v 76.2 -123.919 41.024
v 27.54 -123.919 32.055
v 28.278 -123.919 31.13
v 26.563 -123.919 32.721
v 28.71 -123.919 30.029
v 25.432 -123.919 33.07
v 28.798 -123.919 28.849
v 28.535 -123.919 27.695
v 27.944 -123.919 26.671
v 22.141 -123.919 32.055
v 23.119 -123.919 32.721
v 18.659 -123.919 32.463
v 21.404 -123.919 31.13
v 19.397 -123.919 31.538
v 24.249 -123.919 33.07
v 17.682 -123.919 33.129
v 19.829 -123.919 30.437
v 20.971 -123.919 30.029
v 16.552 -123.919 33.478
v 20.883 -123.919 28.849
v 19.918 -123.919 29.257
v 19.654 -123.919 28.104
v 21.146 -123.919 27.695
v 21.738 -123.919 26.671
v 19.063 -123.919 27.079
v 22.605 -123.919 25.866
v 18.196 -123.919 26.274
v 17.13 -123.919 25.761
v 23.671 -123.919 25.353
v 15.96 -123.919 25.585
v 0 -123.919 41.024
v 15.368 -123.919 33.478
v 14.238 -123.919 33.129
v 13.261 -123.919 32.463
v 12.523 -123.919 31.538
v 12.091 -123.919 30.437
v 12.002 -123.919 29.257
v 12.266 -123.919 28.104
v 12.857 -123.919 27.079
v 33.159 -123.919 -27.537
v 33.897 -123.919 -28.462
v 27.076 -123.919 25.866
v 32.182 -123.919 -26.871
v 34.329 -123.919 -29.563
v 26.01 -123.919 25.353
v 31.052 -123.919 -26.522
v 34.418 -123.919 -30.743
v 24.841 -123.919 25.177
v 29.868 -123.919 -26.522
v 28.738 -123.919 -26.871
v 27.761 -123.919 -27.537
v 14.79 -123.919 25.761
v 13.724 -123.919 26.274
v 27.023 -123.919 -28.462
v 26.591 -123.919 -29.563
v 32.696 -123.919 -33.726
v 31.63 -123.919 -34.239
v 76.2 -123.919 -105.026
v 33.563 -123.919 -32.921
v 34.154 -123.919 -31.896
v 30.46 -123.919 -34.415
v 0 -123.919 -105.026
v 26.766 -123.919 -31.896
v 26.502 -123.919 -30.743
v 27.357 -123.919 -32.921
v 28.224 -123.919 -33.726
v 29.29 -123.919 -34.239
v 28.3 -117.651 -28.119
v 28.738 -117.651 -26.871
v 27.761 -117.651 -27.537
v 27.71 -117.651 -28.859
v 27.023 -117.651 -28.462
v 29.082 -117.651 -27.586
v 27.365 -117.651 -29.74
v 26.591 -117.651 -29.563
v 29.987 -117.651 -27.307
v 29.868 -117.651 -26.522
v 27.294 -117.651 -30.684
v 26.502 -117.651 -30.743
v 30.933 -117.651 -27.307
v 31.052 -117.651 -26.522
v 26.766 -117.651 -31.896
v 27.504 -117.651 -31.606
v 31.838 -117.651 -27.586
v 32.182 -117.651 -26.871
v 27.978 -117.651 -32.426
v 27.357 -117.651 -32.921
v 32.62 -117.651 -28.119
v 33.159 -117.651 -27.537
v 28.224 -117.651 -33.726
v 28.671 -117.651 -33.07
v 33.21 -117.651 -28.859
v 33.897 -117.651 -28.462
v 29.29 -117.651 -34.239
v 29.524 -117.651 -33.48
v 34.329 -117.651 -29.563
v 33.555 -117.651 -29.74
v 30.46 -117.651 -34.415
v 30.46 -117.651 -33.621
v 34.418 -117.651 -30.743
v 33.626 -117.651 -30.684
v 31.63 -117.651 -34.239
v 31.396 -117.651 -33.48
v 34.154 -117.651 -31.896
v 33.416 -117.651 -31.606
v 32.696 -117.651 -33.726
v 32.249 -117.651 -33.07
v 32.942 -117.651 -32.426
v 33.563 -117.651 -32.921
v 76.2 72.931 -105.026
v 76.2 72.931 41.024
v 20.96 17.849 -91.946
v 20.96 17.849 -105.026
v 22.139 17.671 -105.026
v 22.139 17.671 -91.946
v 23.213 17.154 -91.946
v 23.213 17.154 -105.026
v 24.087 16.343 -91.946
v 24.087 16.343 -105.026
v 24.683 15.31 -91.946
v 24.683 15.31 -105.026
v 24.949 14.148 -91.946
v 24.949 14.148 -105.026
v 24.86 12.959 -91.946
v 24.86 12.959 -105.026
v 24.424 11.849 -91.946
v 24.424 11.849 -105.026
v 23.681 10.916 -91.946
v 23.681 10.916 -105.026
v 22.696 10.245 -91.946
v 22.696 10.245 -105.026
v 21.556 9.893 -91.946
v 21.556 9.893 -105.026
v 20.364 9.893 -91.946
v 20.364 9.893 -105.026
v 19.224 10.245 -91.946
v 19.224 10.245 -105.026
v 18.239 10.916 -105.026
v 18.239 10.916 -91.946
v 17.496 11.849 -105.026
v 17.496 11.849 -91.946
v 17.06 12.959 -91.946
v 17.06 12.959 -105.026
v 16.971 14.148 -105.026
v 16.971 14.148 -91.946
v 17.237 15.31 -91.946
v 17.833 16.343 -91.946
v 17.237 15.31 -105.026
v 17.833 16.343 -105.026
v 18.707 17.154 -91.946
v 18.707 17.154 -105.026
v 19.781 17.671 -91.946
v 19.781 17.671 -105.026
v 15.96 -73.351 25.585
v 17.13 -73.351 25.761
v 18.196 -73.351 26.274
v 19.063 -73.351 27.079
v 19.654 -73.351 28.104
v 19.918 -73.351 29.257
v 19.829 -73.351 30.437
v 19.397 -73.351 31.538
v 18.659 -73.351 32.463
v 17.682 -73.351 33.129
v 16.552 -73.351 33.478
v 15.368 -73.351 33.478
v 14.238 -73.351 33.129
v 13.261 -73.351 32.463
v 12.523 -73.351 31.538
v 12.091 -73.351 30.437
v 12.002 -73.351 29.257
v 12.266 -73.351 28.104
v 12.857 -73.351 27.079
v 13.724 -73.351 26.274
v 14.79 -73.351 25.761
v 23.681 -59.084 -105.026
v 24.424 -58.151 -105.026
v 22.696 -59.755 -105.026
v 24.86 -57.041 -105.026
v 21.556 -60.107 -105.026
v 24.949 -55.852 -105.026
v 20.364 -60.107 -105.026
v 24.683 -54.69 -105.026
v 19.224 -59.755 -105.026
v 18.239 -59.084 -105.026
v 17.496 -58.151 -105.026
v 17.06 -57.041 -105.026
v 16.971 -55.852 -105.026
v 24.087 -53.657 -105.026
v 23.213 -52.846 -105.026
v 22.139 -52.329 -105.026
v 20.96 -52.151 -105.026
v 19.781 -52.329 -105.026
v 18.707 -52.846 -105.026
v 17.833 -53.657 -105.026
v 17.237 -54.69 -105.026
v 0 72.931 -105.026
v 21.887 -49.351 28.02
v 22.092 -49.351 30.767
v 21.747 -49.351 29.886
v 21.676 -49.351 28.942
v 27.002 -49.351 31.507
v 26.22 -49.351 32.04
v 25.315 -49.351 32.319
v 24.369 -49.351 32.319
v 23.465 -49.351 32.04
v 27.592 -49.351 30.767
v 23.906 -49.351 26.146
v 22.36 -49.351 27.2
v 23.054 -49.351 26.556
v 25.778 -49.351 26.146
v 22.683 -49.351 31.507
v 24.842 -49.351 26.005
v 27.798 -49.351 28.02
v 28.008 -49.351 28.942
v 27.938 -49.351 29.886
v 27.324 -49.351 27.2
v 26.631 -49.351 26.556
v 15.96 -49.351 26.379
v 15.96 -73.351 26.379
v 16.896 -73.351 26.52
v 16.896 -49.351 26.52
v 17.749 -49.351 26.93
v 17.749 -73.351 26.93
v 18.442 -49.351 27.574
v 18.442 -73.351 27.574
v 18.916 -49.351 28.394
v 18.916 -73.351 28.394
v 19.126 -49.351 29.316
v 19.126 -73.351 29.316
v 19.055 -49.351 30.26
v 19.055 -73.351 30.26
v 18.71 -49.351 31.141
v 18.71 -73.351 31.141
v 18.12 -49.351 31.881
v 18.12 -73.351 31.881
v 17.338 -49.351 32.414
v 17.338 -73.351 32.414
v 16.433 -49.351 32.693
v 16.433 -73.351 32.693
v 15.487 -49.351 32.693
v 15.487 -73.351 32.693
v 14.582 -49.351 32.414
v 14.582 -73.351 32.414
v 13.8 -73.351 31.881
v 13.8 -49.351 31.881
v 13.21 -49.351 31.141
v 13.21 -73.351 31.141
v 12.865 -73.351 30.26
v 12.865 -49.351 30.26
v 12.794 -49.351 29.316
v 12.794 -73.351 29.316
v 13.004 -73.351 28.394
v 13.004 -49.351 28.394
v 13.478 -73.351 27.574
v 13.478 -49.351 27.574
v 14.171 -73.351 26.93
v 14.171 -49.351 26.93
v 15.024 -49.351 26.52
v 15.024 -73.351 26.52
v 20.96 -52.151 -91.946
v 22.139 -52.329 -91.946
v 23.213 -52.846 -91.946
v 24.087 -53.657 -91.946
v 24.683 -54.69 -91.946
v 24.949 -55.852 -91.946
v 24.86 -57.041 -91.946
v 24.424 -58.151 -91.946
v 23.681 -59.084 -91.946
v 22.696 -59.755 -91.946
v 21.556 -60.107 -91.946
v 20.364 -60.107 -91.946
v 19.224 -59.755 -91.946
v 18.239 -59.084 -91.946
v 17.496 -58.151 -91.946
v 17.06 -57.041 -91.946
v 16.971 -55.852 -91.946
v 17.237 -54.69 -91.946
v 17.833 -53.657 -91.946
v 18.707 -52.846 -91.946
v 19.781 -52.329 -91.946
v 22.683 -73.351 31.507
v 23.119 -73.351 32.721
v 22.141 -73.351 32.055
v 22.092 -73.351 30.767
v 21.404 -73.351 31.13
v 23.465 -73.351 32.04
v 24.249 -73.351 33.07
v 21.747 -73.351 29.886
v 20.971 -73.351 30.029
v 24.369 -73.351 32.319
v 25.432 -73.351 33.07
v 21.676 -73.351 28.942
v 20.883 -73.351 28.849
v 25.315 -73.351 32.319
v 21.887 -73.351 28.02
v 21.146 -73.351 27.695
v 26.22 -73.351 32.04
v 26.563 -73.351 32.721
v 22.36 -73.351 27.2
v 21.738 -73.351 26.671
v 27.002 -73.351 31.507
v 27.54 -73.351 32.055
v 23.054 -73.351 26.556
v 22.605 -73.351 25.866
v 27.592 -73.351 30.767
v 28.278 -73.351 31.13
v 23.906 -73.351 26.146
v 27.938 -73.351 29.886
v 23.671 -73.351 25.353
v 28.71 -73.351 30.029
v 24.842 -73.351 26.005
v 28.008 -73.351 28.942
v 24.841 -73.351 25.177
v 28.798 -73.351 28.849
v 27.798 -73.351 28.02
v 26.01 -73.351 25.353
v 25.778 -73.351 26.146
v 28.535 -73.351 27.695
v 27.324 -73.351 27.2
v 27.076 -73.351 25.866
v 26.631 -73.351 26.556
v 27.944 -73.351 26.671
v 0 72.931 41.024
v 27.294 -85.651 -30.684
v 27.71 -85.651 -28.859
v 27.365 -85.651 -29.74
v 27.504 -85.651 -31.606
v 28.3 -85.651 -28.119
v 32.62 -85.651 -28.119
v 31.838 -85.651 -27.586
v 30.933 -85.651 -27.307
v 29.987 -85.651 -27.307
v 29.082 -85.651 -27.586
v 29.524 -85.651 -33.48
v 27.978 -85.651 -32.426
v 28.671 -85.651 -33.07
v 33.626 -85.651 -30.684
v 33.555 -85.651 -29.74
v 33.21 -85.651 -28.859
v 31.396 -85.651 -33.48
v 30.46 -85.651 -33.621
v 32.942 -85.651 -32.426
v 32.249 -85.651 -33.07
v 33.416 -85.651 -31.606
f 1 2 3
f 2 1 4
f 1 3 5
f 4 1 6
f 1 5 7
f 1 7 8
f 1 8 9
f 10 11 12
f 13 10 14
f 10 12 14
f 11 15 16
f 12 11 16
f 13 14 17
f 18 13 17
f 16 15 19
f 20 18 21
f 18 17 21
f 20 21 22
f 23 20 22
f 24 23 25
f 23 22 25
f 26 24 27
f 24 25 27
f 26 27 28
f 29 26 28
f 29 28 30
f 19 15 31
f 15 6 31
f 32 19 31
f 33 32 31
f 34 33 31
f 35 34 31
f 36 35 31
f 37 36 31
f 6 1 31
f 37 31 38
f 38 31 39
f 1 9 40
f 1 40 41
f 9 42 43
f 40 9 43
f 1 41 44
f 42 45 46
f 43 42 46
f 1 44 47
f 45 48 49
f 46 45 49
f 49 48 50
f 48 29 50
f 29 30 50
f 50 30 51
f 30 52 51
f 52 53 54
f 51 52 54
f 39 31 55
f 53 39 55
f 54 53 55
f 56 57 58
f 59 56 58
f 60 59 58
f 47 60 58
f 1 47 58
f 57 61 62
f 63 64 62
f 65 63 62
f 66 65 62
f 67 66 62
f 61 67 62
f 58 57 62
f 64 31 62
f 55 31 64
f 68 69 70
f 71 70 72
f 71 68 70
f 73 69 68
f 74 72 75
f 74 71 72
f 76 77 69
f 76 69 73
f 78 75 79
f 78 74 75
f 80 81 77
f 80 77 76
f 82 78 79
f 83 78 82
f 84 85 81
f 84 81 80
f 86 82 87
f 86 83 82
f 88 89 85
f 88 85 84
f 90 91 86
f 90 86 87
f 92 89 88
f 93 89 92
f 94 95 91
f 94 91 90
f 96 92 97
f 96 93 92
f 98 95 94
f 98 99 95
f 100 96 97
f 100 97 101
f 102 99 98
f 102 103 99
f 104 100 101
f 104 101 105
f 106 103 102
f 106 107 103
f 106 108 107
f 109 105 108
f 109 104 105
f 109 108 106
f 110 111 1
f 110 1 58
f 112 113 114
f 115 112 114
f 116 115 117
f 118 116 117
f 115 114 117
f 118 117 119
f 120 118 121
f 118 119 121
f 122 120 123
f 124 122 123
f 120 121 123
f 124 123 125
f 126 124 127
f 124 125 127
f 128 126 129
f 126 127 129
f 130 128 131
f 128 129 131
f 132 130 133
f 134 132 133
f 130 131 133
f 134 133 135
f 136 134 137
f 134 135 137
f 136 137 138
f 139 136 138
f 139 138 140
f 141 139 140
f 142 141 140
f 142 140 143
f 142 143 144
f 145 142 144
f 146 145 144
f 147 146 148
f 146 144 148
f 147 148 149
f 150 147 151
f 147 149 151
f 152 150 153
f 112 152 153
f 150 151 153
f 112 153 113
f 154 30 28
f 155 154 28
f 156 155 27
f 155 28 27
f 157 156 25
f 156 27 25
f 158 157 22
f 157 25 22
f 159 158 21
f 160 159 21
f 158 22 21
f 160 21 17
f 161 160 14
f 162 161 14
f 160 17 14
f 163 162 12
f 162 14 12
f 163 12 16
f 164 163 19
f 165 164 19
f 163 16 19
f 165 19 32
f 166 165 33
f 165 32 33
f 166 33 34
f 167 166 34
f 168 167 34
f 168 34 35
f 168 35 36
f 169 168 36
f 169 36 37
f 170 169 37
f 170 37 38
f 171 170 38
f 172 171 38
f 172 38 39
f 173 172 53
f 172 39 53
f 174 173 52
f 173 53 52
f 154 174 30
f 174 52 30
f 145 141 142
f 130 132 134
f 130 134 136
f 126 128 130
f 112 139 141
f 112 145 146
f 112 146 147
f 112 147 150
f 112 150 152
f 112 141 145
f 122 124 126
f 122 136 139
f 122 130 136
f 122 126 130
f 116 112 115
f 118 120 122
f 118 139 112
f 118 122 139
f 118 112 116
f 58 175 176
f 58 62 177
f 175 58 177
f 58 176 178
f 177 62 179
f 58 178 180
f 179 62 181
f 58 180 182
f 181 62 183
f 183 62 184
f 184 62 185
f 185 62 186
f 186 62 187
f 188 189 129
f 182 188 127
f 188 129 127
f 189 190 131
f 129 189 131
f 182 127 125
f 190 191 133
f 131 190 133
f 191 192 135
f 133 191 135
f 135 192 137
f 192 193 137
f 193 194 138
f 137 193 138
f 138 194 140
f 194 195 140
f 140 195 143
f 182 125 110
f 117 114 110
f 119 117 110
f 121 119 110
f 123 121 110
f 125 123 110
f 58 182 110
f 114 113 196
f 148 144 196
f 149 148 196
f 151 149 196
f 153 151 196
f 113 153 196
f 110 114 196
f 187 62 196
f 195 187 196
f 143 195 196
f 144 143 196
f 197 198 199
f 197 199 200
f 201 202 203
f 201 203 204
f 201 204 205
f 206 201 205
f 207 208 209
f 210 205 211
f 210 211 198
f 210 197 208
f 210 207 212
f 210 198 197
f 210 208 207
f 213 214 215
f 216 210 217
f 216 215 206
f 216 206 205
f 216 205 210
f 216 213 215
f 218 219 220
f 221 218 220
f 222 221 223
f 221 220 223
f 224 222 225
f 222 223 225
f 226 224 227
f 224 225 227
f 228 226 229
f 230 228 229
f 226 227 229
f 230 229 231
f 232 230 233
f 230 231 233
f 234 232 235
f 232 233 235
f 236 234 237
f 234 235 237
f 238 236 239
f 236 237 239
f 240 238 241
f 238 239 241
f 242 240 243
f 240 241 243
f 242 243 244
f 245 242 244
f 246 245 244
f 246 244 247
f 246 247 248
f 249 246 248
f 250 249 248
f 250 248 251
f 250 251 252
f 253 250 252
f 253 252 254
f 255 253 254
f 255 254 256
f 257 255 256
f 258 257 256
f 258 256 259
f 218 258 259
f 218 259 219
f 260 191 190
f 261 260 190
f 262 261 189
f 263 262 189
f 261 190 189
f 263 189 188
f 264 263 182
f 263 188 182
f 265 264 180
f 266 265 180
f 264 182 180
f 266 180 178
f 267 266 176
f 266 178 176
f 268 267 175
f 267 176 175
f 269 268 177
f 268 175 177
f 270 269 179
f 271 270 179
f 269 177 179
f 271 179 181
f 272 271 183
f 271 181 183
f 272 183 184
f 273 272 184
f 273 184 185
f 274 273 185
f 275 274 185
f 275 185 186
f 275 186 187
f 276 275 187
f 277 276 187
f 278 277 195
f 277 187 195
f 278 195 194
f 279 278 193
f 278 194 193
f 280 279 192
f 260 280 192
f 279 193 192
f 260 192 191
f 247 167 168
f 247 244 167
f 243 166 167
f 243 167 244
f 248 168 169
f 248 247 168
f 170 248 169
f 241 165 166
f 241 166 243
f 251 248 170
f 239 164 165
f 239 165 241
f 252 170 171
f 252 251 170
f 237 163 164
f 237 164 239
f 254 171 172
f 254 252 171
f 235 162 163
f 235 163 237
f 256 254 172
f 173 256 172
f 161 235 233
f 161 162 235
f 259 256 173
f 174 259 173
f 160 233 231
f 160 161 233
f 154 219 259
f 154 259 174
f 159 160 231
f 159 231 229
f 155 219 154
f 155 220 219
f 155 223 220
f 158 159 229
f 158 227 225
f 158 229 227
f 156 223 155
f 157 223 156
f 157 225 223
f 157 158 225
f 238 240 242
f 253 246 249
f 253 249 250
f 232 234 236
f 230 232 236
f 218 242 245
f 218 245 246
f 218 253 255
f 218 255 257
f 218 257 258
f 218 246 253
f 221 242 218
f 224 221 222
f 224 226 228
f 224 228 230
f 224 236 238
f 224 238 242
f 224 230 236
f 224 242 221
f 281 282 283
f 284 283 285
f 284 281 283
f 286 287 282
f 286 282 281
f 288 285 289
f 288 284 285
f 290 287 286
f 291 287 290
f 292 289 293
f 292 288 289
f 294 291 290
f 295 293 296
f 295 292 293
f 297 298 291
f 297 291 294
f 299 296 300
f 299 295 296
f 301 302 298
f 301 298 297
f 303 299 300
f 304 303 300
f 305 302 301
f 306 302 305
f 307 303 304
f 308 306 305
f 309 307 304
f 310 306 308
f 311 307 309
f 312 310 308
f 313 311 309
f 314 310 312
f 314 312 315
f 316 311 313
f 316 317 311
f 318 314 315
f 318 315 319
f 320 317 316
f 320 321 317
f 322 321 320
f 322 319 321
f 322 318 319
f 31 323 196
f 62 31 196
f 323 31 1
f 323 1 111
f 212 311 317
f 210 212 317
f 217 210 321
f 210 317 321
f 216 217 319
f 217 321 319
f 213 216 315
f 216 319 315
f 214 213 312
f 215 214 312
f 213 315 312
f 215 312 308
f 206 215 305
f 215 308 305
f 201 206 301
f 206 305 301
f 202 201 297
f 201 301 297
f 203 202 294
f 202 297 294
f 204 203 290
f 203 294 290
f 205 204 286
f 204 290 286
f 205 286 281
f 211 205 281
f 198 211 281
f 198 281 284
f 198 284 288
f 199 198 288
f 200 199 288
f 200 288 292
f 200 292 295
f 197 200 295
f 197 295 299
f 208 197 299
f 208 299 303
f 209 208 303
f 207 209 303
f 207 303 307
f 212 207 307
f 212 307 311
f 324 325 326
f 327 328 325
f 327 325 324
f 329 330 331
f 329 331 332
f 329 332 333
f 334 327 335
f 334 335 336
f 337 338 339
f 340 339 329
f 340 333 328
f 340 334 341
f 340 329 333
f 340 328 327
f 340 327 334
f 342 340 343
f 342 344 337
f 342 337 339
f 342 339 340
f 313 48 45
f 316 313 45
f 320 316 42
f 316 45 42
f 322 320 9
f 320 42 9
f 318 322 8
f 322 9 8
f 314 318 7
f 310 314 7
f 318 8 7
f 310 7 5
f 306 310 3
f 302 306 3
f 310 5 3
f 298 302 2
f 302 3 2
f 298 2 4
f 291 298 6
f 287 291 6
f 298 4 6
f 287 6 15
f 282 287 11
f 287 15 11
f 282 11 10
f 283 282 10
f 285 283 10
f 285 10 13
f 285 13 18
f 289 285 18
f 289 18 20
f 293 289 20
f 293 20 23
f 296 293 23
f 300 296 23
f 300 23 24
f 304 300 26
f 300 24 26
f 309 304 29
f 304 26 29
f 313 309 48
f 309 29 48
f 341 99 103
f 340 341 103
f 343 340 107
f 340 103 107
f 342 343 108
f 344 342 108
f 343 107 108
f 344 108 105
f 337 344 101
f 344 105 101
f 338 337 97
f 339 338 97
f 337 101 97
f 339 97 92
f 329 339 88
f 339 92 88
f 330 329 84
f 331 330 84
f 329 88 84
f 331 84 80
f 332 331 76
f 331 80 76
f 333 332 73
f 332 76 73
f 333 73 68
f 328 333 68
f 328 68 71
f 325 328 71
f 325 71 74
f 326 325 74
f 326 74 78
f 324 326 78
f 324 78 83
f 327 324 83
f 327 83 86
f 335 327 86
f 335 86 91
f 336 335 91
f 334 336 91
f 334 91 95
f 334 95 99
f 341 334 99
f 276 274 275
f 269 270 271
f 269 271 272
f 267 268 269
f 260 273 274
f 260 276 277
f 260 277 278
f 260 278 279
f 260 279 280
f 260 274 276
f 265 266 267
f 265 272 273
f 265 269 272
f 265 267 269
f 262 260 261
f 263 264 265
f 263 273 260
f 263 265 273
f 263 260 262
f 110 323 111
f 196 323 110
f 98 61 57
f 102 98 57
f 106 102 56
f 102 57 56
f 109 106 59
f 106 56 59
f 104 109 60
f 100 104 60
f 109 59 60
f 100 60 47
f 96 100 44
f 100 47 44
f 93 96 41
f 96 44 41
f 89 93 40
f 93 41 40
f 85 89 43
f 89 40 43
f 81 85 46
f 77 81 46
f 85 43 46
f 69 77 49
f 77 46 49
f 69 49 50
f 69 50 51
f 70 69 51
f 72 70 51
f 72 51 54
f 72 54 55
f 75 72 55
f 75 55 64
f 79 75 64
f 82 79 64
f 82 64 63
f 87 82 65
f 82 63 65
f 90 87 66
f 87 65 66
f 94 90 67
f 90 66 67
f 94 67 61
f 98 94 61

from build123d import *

# Parameters (mm, degrees)
SKETCH1_W           = 146.05
SKETCH1_H           = 196.85
BOSS_EXTRUDE1_DEPTH = 76.2
SKETCH2_R           = 3.175
CUT_EXTRUDE1_DEPTH  = 74.5679992
SKETCH3_R           = 3.96875
CUT_EXTRUDE2_DEPTH  = 50.5679964
SKETCH4_R           = 3.175
CUT_EXTRUDE3_DEPTH  = 38.2679956
SKETCH5_R           = 3.96875
CUT_EXTRUDE4_DEPTH  = 6.2680088
SKETCH6_R           = 4
CUT_EXTRUDE5_DEPTH  = 13.0800094


with BuildPart() as part:
    # Sketch1 → Boss-Extrude1 (new body)
    with BuildSketch(Plane(origin=(0, 0, 0), x_dir=(0, 0, -1), z_dir=(1, 0, 0))):
        with Locations((32.001485149, -25.494306931)):
            Rectangle(SKETCH1_W, SKETCH1_H)
    extrude(amount=BOSS_EXTRUDE1_DEPTH)

    # Sketch2 → Cut-Extrude1 (cut)
    with BuildSketch(Plane.XZ.offset(123.919306931)):
        with Locations(Location((15.96, 29.553514851, 0), (0, 0, 270))):
            Circle(SKETCH2_R)
        with Locations(Location((24.84213013, 29.179530425, 0), (0, 0, 270))):
            Circle(SKETCH2_R)
    extrude(amount=-CUT_EXTRUDE1_DEPTH, mode=Mode.SUBTRACT)

    # Sketch3 → Cut-Extrude2 (cut)
    with BuildSketch(Plane.XZ.offset(123.919306931)):
        with Locations(Location((24.840626577, 29.145383002, 0), (0, 0, 270))):
            Circle(SKETCH3_R)
        with Locations(Location((15.96, 29.553514851, 0), (0, 0, 270))):
            Circle(SKETCH3_R)
    extrude(amount=-CUT_EXTRUDE2_DEPTH, mode=Mode.SUBTRACT)

    # Sketch4 → Cut-Extrude3 (cut)
    with BuildSketch(Plane.XZ.offset(123.919306931)):
        with Locations(Location((30.46, -30.446485149, 0), (0, 0, 270))):
            Circle(SKETCH4_R)
    extrude(amount=-CUT_EXTRUDE3_DEPTH, mode=Mode.SUBTRACT)

    # Sketch5 → Cut-Extrude4 (cut)
    with BuildSketch(Plane.XZ.offset(123.919306931)):
        with Locations(Location((30.46, -30.446485149, 0), (0, 0, 270))):
            Circle(SKETCH5_R)
    extrude(amount=-CUT_EXTRUDE4_DEPTH, mode=Mode.SUBTRACT)

    # Sketch6 → Cut-Extrude5 (cut)
    with BuildSketch(Plane(origin=(0, 0, -105.026485149), x_dir=(-1, 0, 0), z_dir=(0, 0, -1))):
        with Locations(Location((-20.96, -56.151306931, 0), (0, 0, 90))):
            Circle(SKETCH6_R)
        with Locations(Location((-20.96, 13.848693069, 0), (0, 0, 90))):
            Circle(SKETCH6_R)
    extrude(amount=-CUT_EXTRUDE5_DEPTH, mode=Mode.SUBTRACT)


solid = part.part
